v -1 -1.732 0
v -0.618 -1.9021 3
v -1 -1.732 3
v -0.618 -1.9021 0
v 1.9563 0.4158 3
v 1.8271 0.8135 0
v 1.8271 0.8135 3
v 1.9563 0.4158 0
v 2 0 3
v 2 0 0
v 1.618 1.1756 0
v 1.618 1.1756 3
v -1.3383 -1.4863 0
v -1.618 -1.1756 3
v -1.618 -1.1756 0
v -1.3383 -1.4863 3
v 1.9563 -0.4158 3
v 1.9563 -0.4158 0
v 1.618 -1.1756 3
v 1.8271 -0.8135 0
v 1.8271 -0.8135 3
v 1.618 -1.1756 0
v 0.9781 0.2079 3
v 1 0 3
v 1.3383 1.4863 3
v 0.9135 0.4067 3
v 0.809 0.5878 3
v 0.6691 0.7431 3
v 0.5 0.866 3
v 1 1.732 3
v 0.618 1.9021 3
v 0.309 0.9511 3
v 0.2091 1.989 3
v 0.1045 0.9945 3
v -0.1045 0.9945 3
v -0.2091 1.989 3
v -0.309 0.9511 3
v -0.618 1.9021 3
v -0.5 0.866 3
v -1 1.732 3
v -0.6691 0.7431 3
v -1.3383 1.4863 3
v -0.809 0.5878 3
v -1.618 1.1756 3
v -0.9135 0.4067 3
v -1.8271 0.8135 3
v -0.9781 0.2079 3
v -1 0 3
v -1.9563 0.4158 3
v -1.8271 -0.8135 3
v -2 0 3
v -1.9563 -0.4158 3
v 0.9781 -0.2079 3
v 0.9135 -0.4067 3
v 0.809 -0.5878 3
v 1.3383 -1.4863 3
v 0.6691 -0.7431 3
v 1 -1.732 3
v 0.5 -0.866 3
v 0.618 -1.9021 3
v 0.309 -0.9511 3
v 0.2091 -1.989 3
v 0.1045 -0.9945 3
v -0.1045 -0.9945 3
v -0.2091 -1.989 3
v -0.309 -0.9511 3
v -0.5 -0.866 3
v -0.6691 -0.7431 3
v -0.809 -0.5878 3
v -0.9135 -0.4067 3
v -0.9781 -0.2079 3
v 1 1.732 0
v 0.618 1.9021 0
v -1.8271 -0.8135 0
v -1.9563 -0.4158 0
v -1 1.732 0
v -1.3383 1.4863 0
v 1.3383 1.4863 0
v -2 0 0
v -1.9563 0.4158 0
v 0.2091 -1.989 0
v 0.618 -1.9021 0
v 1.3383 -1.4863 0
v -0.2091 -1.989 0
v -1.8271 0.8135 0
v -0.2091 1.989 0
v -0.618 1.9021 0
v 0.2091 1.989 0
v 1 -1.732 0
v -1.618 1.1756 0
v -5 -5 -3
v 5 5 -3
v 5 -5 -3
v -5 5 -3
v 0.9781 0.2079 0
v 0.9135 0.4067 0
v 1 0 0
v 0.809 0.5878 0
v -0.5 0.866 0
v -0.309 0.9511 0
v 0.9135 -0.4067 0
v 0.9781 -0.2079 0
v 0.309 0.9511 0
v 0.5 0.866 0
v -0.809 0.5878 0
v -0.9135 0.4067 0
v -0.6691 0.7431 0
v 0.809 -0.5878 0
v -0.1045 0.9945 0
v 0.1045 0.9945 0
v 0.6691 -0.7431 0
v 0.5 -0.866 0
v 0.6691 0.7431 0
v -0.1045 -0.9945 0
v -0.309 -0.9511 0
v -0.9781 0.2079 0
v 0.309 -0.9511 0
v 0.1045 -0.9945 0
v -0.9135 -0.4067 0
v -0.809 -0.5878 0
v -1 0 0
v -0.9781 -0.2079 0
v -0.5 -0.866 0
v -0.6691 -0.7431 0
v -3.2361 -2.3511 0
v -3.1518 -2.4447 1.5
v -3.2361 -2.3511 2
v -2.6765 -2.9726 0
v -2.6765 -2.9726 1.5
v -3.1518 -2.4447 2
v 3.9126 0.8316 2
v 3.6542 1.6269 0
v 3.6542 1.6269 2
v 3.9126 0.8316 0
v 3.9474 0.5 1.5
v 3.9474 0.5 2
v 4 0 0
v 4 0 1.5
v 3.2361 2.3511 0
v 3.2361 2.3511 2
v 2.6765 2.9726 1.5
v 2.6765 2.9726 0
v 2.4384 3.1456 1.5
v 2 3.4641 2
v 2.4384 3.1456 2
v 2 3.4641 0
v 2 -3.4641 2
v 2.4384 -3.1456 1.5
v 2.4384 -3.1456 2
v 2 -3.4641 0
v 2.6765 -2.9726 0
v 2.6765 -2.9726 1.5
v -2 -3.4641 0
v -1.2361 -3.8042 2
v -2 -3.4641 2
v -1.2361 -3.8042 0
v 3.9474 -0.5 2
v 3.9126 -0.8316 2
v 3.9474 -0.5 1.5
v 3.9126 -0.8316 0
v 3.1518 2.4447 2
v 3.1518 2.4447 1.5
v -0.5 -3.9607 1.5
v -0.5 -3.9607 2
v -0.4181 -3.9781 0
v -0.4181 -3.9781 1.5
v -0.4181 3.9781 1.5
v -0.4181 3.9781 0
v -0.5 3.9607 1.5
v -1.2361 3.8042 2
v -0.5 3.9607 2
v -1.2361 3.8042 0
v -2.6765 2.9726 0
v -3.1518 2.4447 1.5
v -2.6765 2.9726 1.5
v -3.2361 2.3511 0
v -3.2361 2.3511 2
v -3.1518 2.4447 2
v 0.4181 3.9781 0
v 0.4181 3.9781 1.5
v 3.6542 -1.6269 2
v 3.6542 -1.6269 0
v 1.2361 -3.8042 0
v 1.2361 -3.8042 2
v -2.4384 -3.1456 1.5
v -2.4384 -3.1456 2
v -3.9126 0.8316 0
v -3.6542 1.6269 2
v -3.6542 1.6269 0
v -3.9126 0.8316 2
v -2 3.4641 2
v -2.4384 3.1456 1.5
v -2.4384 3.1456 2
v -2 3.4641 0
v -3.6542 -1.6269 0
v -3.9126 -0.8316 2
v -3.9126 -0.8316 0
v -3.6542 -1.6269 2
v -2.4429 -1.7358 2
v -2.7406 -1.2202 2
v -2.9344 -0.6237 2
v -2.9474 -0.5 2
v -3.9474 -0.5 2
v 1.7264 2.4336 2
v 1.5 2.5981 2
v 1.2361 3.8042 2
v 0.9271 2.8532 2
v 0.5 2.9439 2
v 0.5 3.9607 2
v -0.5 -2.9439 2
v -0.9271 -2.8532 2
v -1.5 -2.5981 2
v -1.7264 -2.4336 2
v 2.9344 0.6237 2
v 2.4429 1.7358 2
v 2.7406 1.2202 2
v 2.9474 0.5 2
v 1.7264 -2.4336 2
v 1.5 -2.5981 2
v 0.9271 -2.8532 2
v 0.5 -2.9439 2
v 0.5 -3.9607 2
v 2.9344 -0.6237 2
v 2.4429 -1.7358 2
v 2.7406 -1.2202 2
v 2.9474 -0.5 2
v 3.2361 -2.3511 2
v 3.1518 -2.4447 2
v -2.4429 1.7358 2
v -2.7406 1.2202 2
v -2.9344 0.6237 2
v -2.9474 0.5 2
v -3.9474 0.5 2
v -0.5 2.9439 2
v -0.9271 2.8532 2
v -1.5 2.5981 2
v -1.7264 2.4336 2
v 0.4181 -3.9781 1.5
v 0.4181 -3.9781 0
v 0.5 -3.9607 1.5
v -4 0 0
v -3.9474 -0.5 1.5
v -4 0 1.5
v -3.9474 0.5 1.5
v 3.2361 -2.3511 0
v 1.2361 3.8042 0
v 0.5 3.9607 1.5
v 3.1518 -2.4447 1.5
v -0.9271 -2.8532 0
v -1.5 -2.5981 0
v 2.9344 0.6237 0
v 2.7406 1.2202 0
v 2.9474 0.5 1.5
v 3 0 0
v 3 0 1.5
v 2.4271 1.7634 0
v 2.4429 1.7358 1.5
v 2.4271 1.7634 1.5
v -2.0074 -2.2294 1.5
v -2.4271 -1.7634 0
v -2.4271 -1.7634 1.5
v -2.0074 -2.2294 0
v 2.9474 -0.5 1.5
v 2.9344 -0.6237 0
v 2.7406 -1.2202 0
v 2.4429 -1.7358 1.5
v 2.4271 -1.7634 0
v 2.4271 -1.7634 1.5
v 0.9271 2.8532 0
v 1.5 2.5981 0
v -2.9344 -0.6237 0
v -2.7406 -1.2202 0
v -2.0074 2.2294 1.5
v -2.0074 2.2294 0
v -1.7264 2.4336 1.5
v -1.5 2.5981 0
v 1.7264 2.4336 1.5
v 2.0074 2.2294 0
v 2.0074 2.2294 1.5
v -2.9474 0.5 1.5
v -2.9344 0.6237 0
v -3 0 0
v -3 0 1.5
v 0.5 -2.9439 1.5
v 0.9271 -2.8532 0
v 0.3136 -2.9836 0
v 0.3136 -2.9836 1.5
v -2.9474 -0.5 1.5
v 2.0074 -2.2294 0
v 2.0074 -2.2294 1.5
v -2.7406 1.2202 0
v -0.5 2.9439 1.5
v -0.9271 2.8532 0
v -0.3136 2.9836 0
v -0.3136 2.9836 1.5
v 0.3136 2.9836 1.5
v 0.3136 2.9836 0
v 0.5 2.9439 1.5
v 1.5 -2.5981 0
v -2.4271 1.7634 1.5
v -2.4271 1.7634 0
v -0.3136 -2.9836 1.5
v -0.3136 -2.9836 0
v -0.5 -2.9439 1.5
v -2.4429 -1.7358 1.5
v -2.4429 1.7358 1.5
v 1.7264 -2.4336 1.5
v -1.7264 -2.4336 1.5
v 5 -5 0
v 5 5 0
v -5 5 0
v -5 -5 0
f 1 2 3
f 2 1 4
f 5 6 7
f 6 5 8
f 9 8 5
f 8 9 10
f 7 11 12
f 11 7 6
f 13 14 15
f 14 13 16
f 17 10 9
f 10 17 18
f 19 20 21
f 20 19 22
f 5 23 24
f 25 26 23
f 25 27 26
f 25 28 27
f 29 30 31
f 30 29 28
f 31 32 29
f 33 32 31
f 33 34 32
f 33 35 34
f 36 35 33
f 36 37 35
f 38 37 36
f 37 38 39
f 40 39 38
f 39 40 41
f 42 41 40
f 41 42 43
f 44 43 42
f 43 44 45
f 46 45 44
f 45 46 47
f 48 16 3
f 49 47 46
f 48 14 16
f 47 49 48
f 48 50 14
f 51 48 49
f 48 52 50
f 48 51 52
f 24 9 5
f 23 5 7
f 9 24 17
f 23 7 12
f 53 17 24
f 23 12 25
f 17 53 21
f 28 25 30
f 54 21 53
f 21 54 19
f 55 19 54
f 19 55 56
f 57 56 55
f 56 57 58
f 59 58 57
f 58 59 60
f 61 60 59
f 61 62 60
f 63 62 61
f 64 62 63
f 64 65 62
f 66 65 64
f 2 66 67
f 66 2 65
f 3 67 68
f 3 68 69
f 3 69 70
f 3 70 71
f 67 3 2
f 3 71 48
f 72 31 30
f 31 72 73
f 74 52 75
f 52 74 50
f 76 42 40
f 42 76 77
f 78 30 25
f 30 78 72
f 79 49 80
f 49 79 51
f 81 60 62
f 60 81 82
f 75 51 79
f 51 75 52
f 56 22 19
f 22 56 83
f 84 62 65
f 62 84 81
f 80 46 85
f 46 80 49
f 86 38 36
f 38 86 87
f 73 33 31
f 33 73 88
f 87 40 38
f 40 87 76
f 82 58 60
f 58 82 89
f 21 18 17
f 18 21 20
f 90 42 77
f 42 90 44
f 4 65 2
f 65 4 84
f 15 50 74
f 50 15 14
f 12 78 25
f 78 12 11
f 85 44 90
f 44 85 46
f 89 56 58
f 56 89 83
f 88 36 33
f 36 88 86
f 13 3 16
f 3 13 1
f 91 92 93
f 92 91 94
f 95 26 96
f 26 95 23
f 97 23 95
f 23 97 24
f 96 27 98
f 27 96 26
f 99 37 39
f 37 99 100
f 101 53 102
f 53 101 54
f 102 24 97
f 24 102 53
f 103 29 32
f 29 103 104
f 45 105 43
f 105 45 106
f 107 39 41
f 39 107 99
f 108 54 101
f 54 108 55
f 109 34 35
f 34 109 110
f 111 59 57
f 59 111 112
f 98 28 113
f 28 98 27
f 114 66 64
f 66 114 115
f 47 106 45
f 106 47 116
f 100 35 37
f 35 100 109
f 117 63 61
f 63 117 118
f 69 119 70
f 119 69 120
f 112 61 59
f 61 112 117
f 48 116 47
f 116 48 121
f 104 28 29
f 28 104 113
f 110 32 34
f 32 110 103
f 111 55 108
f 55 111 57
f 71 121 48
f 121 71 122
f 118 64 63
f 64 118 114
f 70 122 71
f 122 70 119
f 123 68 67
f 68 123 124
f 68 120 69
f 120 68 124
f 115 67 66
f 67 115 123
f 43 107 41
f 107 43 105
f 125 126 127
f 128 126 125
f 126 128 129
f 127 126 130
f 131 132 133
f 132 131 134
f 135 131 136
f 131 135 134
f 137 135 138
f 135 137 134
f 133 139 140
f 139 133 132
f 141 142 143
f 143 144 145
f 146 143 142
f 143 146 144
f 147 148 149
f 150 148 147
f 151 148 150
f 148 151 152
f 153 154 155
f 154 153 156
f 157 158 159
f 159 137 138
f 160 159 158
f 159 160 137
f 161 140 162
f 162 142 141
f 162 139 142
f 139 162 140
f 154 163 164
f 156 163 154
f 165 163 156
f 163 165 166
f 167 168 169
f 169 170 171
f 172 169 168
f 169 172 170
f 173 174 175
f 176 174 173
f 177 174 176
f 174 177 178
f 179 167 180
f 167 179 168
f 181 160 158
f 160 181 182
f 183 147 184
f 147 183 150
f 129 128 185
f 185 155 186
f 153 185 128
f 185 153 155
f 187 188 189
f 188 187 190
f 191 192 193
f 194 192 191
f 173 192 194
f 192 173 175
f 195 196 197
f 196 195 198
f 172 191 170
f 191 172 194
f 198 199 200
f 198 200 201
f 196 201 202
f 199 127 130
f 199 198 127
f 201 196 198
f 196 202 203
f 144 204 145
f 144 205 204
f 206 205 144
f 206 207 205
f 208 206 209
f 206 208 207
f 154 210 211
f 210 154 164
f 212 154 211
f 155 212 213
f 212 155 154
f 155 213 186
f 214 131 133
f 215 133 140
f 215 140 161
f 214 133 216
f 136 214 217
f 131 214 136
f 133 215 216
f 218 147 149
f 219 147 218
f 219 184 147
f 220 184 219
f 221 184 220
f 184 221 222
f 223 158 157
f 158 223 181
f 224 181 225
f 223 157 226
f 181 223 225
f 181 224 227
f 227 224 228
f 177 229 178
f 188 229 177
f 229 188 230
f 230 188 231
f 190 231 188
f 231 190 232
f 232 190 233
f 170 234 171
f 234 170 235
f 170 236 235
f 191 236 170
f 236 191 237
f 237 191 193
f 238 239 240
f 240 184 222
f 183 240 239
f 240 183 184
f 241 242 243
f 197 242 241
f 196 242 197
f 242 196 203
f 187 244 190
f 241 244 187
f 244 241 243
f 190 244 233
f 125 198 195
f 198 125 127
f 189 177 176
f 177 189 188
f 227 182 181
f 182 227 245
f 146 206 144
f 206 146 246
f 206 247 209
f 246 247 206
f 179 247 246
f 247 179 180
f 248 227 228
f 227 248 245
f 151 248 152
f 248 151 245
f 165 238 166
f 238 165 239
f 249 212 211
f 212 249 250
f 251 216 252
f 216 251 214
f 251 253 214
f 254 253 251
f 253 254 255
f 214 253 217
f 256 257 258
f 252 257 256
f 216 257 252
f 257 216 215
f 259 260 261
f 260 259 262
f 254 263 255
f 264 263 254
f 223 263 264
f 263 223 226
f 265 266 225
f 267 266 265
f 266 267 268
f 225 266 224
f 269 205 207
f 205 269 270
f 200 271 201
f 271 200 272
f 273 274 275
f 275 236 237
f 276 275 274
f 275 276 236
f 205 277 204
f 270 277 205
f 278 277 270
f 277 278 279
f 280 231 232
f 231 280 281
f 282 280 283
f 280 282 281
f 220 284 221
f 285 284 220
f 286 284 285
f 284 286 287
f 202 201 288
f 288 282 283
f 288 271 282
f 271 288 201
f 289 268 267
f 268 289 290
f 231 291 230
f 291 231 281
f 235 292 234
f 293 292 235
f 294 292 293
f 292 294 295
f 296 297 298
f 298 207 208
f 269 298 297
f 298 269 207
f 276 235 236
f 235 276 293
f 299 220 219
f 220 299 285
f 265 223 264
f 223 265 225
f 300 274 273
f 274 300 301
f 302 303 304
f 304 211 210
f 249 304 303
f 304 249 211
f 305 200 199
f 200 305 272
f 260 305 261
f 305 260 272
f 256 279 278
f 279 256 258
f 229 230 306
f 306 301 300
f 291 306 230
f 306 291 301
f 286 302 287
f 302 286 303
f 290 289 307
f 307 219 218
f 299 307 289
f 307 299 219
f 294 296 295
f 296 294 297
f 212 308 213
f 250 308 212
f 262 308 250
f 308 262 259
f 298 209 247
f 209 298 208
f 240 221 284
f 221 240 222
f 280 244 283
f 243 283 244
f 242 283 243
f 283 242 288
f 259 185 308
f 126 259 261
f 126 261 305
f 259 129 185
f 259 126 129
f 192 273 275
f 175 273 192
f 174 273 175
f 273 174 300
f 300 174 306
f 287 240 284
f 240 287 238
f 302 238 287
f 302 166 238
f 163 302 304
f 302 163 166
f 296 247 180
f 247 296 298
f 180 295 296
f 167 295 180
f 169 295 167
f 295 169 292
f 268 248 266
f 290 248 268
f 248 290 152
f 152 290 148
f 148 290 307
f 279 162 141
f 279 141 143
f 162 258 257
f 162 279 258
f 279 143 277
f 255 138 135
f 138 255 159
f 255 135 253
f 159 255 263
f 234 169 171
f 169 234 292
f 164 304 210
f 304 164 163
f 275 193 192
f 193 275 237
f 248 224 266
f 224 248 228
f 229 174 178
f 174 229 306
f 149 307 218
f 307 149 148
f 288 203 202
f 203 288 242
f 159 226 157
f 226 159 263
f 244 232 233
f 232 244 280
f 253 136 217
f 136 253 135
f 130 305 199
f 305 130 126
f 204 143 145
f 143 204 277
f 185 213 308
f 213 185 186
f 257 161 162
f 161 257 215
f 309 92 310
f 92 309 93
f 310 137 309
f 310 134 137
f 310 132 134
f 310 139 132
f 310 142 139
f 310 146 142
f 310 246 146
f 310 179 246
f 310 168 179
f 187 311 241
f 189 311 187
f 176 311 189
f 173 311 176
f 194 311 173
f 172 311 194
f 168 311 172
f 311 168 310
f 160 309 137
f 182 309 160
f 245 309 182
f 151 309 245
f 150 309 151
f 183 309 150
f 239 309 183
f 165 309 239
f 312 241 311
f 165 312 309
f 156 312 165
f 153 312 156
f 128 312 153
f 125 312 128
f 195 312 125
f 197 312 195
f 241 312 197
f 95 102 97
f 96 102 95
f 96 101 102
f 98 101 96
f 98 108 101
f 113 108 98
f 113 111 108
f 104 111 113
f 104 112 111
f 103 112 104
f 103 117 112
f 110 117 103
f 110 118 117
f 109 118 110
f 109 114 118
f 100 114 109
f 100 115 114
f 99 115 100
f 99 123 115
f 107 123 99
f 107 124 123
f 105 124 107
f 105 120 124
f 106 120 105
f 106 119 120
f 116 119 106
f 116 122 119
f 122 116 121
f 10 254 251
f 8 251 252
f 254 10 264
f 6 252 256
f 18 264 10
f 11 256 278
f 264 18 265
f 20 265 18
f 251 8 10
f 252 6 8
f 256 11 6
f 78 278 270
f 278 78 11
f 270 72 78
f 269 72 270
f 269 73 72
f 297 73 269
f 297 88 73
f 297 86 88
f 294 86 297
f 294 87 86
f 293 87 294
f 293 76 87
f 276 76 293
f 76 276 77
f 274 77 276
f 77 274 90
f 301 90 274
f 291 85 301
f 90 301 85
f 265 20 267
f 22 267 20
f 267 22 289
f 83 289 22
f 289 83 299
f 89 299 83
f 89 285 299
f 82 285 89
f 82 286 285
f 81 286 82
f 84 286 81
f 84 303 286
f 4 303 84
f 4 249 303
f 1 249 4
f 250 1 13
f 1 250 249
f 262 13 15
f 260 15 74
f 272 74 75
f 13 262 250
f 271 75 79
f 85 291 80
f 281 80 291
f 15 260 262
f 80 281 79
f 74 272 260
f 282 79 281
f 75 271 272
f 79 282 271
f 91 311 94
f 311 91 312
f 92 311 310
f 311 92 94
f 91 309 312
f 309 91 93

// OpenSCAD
union() {
translate([0, 0, -1.5])
cube(size = [10, 10, 3], center = true);

difference() {
cylinder(h = 6, r1 = 2, r2 = 2, center = true, $fn = 30);
cylinder(h = 8, r1 = 1, r2 = 1, center = true, $fn = 30);
}

difference() {
difference() {
cylinder(h = 4, r1 = 4, r2 = 4, center = true, $fn = 30);
cylinder(h = 8, r1 = 3, r2 = 3, center = true, $fn = 30);
}

translate([0, 0, 2])
union() {
cube(size = [1, 10, 1], center = true);

rotate([0, 0, 45])
cube(size = [1, 10, 1], center = true);

rotate([0, 0, 90])
cube(size = [1, 10, 1], center = true);

rotate([0, 0, 135])
cube(size = [1, 10, 1], center = true);
}

}
  
}
